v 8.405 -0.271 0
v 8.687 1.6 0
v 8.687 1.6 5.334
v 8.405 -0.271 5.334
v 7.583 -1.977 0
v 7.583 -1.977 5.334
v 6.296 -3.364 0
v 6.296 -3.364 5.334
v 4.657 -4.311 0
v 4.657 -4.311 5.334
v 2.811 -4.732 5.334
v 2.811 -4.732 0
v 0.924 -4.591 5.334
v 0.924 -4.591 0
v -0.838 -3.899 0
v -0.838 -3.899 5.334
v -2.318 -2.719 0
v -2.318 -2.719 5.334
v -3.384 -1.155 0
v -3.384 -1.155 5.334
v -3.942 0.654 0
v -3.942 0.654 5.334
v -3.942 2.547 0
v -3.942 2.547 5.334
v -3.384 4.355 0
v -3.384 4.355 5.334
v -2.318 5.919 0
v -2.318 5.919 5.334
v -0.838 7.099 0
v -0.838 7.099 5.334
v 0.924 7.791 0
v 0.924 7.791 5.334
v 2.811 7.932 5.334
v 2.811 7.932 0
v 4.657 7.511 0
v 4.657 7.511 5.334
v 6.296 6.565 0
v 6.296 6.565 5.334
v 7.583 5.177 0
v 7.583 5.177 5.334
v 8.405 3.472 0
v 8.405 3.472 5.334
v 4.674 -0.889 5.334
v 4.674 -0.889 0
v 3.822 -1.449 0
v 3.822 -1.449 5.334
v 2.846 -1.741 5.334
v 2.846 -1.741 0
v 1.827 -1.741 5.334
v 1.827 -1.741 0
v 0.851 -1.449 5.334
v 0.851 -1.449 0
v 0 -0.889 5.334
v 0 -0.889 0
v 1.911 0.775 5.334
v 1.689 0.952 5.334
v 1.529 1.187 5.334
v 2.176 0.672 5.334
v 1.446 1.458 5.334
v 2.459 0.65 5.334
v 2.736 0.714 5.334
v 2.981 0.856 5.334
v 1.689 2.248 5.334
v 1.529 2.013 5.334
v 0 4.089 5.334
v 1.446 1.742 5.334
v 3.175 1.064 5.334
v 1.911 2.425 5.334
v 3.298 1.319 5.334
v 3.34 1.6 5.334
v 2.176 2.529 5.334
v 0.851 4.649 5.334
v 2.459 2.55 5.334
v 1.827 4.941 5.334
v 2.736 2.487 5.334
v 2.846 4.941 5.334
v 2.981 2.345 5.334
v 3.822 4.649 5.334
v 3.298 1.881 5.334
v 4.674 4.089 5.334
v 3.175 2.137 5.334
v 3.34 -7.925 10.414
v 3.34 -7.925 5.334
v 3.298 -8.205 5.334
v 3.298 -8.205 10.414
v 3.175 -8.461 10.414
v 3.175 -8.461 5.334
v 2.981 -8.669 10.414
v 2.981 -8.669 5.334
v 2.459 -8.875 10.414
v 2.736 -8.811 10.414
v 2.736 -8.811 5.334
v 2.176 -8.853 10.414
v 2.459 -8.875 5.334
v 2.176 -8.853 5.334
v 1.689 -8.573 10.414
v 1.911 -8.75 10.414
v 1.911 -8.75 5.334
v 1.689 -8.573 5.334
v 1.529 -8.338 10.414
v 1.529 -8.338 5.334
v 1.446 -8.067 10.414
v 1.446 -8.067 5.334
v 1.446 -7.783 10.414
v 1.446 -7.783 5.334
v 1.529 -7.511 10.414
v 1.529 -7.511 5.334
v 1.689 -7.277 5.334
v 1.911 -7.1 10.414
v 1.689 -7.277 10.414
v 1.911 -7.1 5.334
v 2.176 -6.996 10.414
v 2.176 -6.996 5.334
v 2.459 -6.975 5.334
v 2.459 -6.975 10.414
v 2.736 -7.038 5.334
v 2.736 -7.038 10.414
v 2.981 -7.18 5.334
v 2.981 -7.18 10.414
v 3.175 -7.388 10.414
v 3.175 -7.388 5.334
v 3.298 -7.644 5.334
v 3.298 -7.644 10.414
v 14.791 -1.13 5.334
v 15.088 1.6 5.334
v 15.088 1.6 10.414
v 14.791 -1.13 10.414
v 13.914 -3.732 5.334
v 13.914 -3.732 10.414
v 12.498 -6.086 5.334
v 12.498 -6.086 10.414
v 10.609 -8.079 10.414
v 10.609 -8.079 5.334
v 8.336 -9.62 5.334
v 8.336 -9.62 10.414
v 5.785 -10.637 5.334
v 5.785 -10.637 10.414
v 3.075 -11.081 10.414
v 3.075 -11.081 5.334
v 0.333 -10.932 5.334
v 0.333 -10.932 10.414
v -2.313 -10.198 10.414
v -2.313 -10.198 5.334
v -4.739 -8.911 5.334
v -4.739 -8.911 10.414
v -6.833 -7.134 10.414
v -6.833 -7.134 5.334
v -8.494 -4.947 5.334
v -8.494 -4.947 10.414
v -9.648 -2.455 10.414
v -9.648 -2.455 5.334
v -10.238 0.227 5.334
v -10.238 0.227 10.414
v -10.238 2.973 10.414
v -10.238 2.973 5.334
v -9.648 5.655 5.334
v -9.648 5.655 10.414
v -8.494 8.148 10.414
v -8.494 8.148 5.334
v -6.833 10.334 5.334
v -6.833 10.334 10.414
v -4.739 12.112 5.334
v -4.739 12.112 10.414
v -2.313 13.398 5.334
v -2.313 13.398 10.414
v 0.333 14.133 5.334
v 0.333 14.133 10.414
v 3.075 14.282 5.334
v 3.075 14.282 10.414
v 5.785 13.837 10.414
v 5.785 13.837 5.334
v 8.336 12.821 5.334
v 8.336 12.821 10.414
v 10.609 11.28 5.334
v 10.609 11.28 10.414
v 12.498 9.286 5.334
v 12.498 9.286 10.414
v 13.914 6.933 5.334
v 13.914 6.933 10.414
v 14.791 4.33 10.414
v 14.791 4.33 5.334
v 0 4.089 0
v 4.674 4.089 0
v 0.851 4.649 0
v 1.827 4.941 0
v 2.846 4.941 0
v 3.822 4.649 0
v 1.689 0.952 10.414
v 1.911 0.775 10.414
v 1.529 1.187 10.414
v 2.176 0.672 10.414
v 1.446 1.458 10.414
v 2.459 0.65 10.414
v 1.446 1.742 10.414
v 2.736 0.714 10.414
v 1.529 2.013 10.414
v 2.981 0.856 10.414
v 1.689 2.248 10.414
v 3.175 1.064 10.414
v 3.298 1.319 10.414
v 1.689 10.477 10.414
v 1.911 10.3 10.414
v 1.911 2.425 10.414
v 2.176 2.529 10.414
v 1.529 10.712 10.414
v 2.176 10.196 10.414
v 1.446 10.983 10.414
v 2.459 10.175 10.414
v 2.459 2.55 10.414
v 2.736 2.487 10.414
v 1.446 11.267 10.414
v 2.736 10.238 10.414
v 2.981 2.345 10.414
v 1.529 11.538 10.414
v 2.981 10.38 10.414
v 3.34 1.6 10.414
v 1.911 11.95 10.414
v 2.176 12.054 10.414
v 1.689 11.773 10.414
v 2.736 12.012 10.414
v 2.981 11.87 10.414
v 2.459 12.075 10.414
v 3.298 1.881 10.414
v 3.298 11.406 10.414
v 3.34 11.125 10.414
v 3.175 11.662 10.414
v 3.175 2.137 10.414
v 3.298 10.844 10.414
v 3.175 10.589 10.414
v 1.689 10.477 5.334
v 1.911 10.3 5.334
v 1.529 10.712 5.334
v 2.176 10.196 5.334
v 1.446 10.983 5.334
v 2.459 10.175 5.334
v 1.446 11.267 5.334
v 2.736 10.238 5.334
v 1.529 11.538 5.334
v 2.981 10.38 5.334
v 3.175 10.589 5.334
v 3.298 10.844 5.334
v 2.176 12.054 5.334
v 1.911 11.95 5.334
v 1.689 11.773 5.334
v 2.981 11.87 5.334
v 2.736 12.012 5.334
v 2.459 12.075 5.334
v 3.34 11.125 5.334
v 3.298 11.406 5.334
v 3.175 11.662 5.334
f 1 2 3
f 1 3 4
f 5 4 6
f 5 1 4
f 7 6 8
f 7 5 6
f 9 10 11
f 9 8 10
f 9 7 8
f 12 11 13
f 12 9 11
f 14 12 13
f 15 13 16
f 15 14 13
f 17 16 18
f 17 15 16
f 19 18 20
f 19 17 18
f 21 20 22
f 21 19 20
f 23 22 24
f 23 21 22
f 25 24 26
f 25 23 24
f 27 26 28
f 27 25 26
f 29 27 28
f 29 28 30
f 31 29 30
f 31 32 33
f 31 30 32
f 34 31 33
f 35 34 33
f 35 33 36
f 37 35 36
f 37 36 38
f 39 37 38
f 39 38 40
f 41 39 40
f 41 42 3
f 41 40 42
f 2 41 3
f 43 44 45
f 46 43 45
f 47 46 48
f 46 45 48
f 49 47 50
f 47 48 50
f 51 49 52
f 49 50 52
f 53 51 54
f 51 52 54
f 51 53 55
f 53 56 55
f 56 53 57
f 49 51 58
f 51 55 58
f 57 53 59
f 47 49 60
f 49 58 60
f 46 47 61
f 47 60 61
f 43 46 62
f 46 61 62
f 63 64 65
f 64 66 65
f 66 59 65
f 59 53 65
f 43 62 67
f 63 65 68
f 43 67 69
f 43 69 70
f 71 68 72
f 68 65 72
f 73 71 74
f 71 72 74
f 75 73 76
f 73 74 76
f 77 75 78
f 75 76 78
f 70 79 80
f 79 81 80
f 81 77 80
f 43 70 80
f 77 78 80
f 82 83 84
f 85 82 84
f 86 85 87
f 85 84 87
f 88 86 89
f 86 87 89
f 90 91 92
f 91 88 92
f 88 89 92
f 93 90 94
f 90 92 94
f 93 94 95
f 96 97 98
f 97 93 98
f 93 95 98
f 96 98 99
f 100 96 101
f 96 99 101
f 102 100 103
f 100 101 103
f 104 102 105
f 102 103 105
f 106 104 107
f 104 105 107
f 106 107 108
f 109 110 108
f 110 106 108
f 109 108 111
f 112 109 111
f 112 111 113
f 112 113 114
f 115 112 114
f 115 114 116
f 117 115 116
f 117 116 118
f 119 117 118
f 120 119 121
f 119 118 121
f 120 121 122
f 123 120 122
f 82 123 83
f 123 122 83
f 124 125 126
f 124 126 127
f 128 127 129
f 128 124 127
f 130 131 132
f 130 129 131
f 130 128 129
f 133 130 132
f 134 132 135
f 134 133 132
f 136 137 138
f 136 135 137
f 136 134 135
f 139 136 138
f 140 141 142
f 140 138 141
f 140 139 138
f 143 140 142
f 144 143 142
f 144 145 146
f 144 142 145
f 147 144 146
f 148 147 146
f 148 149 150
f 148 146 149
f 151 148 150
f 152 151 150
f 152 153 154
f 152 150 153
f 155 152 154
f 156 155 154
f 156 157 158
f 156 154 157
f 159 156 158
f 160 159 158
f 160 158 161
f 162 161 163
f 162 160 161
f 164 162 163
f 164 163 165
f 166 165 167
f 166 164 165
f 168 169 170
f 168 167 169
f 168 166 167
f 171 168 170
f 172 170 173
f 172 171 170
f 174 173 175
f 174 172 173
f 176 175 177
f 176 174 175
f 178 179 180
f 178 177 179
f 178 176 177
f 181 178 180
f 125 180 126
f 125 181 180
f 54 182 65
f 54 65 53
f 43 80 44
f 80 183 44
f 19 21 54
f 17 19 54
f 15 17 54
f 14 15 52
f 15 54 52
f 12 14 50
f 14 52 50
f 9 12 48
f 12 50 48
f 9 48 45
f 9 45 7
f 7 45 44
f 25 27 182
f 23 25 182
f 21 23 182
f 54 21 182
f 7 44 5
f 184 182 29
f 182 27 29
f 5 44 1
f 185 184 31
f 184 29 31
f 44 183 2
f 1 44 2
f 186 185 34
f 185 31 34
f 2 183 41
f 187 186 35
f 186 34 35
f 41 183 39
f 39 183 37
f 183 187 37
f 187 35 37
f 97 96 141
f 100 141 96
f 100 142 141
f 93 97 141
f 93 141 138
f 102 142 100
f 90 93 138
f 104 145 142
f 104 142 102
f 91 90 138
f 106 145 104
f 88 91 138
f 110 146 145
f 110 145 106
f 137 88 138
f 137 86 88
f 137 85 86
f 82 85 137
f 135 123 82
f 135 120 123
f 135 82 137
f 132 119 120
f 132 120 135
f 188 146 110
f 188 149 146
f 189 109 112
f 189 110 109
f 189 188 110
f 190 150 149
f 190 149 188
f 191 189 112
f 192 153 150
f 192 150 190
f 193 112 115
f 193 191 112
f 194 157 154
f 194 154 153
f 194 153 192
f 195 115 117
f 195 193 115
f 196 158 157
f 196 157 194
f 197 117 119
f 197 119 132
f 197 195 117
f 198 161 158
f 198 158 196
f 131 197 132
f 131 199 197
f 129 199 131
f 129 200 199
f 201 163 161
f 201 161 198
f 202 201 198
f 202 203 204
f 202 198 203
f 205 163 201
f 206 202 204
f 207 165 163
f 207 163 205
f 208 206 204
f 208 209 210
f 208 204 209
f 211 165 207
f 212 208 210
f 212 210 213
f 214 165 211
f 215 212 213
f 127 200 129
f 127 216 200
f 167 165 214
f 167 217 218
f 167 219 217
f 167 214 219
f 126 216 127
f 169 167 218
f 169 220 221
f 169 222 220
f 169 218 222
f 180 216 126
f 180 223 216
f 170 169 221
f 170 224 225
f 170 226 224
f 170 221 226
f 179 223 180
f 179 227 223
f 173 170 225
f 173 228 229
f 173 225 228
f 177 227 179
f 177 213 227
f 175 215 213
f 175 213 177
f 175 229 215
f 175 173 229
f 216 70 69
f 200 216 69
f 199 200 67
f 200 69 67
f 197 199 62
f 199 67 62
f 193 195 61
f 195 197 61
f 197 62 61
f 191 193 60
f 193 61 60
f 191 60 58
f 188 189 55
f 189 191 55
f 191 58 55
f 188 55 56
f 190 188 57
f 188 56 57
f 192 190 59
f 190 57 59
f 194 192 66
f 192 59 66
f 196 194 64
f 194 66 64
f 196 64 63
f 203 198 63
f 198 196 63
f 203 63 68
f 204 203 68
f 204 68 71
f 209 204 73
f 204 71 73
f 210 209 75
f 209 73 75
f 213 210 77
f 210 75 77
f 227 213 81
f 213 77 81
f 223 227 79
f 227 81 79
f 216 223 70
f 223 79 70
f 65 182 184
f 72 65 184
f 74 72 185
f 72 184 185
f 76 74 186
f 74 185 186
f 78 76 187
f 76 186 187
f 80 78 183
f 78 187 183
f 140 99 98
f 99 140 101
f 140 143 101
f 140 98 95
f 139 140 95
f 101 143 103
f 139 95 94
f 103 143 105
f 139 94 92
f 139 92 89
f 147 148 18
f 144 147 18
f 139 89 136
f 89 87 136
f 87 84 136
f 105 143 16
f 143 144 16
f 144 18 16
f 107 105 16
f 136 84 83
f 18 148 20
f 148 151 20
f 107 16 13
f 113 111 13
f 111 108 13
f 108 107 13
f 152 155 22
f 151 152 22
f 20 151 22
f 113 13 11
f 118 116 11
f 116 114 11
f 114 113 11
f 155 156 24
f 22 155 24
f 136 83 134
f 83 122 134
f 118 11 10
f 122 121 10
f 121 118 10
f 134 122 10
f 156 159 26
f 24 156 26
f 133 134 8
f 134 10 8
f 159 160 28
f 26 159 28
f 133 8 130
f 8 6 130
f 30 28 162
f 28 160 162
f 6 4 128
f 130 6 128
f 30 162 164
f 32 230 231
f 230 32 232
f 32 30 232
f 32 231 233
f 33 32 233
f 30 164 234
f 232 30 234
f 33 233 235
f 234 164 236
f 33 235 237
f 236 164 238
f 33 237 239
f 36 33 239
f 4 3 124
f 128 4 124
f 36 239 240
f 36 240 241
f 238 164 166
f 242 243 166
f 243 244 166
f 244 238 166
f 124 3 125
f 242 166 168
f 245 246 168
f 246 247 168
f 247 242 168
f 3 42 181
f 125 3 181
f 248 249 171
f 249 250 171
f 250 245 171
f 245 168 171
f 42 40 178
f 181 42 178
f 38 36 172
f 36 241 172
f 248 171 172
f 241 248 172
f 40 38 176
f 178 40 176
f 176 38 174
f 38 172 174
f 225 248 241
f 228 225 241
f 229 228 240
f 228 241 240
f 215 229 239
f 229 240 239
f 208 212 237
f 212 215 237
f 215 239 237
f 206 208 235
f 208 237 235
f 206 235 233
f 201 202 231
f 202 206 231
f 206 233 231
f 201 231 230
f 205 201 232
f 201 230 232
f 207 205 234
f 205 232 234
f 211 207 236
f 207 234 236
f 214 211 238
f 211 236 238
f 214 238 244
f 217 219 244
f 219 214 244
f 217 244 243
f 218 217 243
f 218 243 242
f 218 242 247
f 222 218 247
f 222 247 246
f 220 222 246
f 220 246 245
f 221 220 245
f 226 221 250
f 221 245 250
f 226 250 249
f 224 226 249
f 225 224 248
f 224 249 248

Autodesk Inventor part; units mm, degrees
ref_plane "YZ Plane" through (0, 0, 0) normal (1, 0, 0) x (0, 1, 0)
ref_plane "XZ Plane" through (0, 0, 0) normal (0, 1, 0) x (-1, 0, 0)
ref_plane "XY Plane" through (0, 0, 0) normal (0, 0, 1) x (1, 0, 0)
sketch "Sketch1" plane through (0, 0, 0) normal (0, 0, 1) x (1, 0, 0)
  line L0 (0, -1.778) -> (4.6736, -1.778) construction
  line L1 (4.6736, -1.778) -> (4.6736, 4.9784) construction
  line L2 (4.6736, 4.9784) -> (0, 4.9784) construction
  line L3 (0, 4.9784) -> (0, -1.778) construction
  line L4 (0, 1.6002) -> (0, 4.0894)
  line L5 (0, 1.6002) -> (0, -0.889)
  line L6 (4.6736, 1.6002) -> (4.6736, 4.0894)
  line L7 (4.6736, 1.6002) -> (4.6736, -0.889)
  arc A0 (4.6736, 4.0894) -> (0, 4.0894) centre (2.3368, 1.4627) ccw
  arc A1 (0, -0.889) -> (4.6736, -0.889) centre (2.3368, 1.7377) ccw
  circle A2 centre (2.3368, 1.6002) radius 6.35
  dimension "d21" = 4.6736
  dimension "d22" = 6.7564
  dimension "d23" = 2.4892
  dimension "d24" = 2.4892
  dimension "d25" = 12.7
  dimension "d30" = 3.5157
  dimension "d31" = 3.5157
  dimension "d32" = 0.2751
  dimension "d33" = 2.3368
  dimension "d34" = 0.1375
  dimension "d35" = 2.3368
extrude "Extrusion1" add sketch "Sketch1" along normal blind 5.334
sketch "Sketch2" plane through (2.3876, 3.4798, 5.334) normal (0, 0, 1) x (1, 0, 0)
  circle A0 centre (0, -1.8796) radius 0.9525
  circle A1 centre (0, -1.8796) radius 12.7
  line L0 (0, 10.8204) -> (0, 4.4702) construction
  circle A2 centre (-0.0508, -1.8796) radius 6.35 projected
  circle A3 centre (0, 7.6453) radius 0.9525
  line L1 (0, -14.5796) -> (0, -8.2294) construction
  circle A4 centre (0, -11.4045) radius 0.9525
  dimension "d26" = 1.905
  dimension "d27" = 25.4
  dimension "d28" = 1.905
  dimension "d29" = 1.905
extrude "Extrusion2" add sketch "Sketch2" along normal blind 5.08 contours A1 | A2
ref_plane "Work Plane1" through (2.3876, 3.4798, -50.8) normal (0, 0, -1) x (-1, 0, 0)
sketch "Sketch5" plane through (2.3876, 3.4798, -50.8) normal (0, 0, -1) x (-1, 0, 0)
  line L0 (2.3876, 0.6096) -> (2.3876, -4.3688) projected
  arc A0 (2.3876, 0.6096) -> (-2.286, 0.6096) centre (0.0508, -2.0171) ccw projected
  line L1 (-2.286, -4.3688) -> (-2.286, 0.6096) projected
  arc A1 (-2.286, -4.3688) -> (2.3876, -4.3688) centre (0.0508, -1.7421) ccw projected
  circle A2 centre (0.0508, -1.8796) radius 6.35 projected
  point P0 (2.3876, -3.4798)
properties part number "Zoetrope_Motor_Connector"
